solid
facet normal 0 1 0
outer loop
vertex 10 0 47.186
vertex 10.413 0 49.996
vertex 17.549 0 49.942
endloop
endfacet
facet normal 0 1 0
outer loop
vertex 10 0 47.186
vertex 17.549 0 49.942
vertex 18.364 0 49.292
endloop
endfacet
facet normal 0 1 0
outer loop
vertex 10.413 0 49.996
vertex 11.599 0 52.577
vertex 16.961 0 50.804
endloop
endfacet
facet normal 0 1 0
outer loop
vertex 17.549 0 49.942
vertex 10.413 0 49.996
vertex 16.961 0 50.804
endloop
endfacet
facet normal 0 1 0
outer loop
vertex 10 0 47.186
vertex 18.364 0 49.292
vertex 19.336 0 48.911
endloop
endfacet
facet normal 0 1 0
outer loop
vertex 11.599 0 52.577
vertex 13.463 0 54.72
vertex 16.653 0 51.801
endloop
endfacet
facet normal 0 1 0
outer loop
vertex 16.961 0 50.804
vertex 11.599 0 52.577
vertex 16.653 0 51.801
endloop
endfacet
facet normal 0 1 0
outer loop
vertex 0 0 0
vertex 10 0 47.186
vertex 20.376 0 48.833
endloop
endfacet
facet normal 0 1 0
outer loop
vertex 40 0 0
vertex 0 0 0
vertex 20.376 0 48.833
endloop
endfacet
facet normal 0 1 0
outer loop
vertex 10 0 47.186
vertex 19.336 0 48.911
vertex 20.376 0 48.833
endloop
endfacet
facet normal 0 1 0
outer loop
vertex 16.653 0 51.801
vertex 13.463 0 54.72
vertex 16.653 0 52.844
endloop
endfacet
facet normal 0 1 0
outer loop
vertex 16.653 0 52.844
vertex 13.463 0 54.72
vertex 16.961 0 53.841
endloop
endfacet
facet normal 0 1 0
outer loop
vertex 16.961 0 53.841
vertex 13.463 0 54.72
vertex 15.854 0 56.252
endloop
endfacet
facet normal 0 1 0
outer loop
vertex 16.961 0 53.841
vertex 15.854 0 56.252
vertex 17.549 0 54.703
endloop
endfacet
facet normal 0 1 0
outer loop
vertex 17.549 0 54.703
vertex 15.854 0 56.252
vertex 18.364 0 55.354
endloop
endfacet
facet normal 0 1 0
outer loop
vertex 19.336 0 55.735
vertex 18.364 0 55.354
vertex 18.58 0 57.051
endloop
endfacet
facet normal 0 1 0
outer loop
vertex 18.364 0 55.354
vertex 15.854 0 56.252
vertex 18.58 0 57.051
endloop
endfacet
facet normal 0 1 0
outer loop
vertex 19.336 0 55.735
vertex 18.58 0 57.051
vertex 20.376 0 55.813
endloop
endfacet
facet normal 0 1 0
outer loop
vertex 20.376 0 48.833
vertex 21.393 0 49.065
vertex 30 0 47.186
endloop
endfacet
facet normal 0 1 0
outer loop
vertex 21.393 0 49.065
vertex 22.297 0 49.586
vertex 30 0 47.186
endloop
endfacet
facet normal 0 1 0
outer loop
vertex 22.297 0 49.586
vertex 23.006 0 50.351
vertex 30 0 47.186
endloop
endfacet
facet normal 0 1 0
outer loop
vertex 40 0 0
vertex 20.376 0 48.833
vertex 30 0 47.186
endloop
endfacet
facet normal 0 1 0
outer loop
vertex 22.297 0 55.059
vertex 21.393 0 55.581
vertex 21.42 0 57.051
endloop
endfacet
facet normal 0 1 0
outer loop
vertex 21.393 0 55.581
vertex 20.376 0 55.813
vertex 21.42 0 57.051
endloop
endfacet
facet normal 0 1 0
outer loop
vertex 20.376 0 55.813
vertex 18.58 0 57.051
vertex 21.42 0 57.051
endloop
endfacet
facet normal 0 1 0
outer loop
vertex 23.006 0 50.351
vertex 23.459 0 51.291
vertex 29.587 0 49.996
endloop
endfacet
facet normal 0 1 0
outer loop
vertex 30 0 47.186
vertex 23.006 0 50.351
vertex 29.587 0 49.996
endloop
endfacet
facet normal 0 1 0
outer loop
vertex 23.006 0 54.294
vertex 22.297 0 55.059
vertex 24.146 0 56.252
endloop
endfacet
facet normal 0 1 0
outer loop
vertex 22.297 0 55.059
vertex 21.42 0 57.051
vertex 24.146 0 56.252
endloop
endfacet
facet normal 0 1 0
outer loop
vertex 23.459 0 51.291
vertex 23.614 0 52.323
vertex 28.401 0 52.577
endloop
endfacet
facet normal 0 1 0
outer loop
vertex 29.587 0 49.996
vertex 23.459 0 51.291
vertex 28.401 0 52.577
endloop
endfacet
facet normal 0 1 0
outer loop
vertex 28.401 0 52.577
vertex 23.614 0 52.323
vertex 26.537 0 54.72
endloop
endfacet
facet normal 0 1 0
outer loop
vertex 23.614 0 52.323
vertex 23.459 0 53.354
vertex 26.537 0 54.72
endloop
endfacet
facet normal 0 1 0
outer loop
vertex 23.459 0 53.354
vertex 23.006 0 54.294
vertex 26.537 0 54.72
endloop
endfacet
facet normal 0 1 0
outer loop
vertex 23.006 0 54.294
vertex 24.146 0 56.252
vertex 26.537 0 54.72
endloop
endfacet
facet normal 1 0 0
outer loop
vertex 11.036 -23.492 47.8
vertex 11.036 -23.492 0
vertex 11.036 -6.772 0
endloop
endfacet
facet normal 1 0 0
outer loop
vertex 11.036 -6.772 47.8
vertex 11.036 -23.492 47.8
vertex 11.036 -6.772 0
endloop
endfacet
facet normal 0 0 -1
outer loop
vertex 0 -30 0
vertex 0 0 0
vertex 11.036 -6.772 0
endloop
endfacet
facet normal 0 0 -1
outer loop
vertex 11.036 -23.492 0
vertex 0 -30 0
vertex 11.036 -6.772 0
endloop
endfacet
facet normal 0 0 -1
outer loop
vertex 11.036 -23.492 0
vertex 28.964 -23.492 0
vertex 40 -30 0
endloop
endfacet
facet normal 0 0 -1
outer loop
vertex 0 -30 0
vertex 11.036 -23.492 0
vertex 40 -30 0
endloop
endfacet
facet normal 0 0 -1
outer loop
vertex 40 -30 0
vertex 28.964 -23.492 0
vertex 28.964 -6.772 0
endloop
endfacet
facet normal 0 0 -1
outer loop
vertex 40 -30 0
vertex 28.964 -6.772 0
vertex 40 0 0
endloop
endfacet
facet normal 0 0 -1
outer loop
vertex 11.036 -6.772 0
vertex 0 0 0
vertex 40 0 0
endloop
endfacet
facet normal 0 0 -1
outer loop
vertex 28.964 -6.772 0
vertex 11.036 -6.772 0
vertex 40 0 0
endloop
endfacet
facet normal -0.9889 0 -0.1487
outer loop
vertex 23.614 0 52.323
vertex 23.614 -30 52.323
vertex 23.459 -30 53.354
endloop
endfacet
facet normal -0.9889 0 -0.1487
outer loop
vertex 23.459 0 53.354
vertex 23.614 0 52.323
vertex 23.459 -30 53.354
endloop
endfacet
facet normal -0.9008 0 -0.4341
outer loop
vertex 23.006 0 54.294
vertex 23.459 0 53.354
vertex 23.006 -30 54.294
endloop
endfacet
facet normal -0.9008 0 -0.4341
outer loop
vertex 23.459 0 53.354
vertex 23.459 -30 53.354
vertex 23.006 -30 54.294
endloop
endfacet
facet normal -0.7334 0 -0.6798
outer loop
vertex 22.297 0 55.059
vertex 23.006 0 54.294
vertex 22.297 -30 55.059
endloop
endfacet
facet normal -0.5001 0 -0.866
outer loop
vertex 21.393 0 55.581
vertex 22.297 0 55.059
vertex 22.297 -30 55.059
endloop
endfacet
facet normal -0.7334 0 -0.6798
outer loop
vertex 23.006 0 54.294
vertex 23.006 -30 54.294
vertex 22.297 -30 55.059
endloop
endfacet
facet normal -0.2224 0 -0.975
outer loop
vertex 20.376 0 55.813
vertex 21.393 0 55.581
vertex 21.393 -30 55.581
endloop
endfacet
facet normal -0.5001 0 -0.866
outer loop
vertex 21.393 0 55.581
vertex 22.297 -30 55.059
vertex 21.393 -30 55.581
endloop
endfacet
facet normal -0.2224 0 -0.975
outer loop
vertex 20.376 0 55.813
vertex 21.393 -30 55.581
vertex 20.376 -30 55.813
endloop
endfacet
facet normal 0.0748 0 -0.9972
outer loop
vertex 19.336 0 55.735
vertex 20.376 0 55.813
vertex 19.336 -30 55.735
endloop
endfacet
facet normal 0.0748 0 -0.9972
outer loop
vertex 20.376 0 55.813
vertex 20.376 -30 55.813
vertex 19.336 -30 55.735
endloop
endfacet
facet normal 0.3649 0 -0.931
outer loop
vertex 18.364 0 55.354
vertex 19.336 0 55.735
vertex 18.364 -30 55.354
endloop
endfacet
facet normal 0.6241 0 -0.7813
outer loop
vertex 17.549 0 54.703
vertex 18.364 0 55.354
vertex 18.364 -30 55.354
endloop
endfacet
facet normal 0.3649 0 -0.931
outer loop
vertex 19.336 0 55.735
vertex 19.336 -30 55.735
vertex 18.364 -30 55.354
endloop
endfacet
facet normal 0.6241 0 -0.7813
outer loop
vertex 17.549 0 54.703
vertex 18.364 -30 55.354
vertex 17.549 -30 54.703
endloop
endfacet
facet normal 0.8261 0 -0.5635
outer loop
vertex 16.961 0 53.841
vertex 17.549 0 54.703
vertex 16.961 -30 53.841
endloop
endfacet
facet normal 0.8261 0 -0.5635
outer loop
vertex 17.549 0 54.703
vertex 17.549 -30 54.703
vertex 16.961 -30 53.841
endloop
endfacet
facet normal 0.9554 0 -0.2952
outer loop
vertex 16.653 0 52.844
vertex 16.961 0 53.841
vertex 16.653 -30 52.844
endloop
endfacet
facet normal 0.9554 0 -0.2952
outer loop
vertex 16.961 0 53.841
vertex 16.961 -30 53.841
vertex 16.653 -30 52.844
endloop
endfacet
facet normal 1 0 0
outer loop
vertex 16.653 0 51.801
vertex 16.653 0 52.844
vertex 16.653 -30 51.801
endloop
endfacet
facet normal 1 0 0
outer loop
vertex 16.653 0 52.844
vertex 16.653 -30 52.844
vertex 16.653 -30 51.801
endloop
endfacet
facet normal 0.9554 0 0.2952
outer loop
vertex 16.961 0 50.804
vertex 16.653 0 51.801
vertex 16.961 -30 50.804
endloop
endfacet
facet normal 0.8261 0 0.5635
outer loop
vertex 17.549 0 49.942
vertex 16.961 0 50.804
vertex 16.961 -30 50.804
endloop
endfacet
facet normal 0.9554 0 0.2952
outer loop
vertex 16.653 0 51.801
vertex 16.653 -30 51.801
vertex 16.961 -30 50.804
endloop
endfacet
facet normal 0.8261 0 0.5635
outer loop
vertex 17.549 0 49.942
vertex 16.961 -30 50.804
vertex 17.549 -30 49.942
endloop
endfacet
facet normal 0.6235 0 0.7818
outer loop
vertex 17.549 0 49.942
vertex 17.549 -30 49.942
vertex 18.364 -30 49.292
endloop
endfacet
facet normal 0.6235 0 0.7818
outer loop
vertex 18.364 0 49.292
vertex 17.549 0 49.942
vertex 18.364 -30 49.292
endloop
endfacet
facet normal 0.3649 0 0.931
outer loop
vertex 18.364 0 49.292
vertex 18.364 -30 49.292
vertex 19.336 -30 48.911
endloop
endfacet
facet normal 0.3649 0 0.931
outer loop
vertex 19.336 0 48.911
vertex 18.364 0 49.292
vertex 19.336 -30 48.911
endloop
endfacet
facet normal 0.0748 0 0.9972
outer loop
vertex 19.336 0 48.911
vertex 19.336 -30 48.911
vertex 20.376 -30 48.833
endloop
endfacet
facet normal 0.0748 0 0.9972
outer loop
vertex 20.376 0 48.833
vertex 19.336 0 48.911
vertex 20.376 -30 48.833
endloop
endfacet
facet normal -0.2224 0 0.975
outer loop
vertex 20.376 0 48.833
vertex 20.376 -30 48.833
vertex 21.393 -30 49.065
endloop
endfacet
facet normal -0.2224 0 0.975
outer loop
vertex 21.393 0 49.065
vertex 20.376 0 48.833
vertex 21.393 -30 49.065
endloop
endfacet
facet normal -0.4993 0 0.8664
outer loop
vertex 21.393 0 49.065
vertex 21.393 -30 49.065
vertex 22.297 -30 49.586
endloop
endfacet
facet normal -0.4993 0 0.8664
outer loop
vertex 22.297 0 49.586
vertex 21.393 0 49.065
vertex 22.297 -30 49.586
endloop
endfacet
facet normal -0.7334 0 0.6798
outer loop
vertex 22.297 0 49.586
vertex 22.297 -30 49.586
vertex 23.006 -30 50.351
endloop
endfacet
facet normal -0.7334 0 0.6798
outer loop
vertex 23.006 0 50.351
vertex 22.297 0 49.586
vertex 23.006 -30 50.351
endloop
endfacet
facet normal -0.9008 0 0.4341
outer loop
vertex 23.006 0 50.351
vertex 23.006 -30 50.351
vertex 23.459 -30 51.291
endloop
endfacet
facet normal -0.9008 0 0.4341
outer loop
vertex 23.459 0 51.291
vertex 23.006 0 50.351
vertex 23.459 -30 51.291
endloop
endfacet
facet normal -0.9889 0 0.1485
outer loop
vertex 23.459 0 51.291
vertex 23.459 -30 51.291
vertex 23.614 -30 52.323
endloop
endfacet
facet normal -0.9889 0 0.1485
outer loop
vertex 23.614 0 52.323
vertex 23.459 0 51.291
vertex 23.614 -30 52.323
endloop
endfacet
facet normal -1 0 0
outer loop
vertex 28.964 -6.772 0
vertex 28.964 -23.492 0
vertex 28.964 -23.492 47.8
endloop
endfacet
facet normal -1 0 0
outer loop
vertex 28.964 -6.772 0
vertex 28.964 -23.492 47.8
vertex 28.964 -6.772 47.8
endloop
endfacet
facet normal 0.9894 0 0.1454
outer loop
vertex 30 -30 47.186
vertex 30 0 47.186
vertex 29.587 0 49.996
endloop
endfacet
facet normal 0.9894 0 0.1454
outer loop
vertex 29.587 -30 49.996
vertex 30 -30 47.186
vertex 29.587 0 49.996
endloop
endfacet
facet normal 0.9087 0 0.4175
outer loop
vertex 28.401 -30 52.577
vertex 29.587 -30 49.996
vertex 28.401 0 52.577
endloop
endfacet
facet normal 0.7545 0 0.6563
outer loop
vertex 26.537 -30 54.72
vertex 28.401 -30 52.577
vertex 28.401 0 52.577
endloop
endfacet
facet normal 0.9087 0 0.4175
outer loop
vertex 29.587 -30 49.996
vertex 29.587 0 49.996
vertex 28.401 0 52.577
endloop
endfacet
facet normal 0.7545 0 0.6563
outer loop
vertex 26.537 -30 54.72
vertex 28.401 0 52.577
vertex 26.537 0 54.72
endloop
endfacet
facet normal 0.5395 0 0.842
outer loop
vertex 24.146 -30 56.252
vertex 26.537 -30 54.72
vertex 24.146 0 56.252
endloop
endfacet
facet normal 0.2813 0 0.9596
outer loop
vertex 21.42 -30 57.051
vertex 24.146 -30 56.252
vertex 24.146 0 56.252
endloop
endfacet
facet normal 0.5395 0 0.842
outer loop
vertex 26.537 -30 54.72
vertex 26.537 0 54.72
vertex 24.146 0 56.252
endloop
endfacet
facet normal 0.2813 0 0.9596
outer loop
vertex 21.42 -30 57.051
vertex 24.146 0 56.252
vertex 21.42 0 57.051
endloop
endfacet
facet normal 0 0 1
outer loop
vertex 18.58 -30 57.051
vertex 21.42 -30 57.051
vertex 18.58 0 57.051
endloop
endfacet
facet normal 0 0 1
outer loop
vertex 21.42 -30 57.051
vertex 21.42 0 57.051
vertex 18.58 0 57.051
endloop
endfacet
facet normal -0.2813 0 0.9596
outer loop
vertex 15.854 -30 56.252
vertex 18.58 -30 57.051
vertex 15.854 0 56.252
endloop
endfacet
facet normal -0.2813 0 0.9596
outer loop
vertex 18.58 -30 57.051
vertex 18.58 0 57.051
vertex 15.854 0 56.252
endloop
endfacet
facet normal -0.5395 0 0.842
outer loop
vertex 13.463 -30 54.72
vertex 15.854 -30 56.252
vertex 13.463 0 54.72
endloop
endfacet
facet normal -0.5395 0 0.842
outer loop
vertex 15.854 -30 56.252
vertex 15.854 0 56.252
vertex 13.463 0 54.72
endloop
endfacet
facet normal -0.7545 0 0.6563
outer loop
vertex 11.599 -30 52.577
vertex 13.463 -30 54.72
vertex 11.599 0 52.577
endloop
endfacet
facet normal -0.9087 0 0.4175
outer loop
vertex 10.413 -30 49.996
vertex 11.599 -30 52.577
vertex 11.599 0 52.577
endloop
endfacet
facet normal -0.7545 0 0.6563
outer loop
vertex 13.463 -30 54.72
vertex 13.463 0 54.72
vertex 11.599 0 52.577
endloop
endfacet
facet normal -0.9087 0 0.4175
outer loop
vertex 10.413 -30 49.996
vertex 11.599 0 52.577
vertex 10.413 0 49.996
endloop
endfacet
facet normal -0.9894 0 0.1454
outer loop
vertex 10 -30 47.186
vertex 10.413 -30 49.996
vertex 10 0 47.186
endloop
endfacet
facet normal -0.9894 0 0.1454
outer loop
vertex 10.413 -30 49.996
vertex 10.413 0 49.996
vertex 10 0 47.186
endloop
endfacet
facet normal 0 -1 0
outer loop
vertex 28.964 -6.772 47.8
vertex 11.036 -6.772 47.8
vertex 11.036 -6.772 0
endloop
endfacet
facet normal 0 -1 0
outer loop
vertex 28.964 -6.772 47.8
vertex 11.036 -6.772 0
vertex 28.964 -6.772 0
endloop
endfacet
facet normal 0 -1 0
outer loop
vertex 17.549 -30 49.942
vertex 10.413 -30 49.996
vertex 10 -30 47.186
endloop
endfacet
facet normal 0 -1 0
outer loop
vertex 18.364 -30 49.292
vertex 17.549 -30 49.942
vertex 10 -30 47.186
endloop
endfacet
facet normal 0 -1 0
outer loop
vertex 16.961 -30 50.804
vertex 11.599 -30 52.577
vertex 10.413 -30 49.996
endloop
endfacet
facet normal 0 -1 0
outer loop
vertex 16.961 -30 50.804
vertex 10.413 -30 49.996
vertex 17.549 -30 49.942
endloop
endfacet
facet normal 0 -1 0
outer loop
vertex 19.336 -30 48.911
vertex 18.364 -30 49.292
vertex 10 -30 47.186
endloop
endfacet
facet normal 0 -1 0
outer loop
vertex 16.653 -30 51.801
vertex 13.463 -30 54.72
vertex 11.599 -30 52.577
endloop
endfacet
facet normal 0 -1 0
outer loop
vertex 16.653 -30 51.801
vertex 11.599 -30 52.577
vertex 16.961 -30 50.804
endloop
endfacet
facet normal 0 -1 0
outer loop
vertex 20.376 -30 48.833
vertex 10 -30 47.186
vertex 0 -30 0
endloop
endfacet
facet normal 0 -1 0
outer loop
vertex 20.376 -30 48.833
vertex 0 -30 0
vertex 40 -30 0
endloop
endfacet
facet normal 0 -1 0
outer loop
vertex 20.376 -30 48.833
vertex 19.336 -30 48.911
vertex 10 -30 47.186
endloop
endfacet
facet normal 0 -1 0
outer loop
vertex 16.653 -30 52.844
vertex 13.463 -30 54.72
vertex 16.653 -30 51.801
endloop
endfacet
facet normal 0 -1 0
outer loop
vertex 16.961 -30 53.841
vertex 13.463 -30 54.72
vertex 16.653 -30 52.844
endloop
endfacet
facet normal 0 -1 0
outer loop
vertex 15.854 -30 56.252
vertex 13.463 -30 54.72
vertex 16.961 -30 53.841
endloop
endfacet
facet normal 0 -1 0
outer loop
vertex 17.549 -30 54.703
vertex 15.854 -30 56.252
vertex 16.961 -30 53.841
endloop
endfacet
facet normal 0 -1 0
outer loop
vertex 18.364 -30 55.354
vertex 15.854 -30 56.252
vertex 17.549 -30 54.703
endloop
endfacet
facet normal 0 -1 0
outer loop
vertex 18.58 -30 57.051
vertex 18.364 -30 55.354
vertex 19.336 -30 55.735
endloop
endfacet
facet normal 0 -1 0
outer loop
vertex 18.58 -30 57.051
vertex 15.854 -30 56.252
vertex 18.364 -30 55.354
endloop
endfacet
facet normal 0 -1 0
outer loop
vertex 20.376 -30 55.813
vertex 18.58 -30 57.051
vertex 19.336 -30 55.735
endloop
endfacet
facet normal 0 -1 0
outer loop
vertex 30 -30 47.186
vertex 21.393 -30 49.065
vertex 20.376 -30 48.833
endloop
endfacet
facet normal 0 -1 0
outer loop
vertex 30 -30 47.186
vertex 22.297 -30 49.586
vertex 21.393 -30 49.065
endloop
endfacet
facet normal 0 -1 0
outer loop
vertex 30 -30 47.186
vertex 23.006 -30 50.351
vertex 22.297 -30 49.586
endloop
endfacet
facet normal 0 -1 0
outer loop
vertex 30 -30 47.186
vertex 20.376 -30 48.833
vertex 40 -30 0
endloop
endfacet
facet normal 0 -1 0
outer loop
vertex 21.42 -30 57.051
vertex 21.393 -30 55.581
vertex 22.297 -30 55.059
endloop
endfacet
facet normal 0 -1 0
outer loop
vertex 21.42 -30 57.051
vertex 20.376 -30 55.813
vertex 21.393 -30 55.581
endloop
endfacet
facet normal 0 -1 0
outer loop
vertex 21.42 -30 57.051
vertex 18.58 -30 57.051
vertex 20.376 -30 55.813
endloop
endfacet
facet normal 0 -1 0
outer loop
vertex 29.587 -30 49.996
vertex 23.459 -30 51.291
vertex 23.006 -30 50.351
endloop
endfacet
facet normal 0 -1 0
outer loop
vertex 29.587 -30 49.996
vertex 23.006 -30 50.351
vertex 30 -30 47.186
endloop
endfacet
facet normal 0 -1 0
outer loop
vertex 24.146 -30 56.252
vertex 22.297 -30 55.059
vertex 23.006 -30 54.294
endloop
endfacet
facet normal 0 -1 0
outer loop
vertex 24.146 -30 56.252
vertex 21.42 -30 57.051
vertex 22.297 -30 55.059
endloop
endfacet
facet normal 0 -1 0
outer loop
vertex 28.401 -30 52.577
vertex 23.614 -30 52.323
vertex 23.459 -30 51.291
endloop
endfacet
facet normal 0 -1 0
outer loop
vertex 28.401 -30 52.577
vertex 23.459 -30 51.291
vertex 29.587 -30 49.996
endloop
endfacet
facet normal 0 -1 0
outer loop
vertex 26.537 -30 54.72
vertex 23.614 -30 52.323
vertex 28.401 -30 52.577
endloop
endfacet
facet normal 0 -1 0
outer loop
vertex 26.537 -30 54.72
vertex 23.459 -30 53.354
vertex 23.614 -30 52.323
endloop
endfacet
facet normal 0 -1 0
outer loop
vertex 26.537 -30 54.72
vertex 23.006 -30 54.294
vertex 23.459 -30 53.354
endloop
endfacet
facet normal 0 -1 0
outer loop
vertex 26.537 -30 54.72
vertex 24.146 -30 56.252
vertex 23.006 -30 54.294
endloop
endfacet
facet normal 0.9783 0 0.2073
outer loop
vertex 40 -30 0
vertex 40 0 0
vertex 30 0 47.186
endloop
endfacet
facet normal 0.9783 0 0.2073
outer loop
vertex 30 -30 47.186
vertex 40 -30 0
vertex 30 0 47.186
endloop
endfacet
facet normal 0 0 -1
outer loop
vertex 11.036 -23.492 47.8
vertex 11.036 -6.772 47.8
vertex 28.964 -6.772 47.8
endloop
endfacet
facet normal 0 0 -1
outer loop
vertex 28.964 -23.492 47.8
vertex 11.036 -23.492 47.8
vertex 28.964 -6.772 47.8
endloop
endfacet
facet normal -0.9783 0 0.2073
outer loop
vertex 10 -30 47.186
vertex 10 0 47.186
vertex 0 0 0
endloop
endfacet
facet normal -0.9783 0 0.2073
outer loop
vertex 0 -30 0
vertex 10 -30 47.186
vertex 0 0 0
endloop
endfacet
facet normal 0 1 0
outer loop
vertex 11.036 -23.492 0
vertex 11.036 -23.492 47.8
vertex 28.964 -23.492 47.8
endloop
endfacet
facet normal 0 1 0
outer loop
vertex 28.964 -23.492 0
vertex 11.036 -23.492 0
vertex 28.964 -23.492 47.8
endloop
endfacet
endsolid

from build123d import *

# Parameters (mm, degrees)
F1_DEPTH = 30
F2_W     = 17.9273141921
F2_H     = 16.7198758554
F3_DEPTH = 47.8
F5_D     = 7


with BuildPart() as f1:
    # F0 (on Front) → F1 (new body)
    with BuildSketch(Plane.XZ):
        Polygon((10, 47.186203301), (0, 0), (40, 0), (30, 47.186203301), (20, 47.186203301), align=None)
        with BuildLine():
            ThreePointArc((30, 47.186203301), (20, 57.1520274516), (10, 47.186203301))
            Line((10, 47.186203301), (20, 47.186203301))
            Line((20, 47.186203301), (30, 47.186203301))
        make_face()
    extrude(amount=F1_DEPTH)

    # F2 (on Top) → F3 (cut, symmetric)
    with BuildSketch(Plane.XY):
        with Locations((20, -15.1315899557)):
            Rectangle(F2_W, F2_H)
    extrude(amount=F3_DEPTH, both=True, mode=Mode.SUBTRACT)

    # F5 (through all)
    with Locations(Plane(origin=(0, 0, 0), x_dir=(-1, 0, 0), z_dir=(0, 1, 0))):
        with Locations((-20.1143659651, 52.3227863014)):
            Hole(F5_D / 2)


solid = f1.part
